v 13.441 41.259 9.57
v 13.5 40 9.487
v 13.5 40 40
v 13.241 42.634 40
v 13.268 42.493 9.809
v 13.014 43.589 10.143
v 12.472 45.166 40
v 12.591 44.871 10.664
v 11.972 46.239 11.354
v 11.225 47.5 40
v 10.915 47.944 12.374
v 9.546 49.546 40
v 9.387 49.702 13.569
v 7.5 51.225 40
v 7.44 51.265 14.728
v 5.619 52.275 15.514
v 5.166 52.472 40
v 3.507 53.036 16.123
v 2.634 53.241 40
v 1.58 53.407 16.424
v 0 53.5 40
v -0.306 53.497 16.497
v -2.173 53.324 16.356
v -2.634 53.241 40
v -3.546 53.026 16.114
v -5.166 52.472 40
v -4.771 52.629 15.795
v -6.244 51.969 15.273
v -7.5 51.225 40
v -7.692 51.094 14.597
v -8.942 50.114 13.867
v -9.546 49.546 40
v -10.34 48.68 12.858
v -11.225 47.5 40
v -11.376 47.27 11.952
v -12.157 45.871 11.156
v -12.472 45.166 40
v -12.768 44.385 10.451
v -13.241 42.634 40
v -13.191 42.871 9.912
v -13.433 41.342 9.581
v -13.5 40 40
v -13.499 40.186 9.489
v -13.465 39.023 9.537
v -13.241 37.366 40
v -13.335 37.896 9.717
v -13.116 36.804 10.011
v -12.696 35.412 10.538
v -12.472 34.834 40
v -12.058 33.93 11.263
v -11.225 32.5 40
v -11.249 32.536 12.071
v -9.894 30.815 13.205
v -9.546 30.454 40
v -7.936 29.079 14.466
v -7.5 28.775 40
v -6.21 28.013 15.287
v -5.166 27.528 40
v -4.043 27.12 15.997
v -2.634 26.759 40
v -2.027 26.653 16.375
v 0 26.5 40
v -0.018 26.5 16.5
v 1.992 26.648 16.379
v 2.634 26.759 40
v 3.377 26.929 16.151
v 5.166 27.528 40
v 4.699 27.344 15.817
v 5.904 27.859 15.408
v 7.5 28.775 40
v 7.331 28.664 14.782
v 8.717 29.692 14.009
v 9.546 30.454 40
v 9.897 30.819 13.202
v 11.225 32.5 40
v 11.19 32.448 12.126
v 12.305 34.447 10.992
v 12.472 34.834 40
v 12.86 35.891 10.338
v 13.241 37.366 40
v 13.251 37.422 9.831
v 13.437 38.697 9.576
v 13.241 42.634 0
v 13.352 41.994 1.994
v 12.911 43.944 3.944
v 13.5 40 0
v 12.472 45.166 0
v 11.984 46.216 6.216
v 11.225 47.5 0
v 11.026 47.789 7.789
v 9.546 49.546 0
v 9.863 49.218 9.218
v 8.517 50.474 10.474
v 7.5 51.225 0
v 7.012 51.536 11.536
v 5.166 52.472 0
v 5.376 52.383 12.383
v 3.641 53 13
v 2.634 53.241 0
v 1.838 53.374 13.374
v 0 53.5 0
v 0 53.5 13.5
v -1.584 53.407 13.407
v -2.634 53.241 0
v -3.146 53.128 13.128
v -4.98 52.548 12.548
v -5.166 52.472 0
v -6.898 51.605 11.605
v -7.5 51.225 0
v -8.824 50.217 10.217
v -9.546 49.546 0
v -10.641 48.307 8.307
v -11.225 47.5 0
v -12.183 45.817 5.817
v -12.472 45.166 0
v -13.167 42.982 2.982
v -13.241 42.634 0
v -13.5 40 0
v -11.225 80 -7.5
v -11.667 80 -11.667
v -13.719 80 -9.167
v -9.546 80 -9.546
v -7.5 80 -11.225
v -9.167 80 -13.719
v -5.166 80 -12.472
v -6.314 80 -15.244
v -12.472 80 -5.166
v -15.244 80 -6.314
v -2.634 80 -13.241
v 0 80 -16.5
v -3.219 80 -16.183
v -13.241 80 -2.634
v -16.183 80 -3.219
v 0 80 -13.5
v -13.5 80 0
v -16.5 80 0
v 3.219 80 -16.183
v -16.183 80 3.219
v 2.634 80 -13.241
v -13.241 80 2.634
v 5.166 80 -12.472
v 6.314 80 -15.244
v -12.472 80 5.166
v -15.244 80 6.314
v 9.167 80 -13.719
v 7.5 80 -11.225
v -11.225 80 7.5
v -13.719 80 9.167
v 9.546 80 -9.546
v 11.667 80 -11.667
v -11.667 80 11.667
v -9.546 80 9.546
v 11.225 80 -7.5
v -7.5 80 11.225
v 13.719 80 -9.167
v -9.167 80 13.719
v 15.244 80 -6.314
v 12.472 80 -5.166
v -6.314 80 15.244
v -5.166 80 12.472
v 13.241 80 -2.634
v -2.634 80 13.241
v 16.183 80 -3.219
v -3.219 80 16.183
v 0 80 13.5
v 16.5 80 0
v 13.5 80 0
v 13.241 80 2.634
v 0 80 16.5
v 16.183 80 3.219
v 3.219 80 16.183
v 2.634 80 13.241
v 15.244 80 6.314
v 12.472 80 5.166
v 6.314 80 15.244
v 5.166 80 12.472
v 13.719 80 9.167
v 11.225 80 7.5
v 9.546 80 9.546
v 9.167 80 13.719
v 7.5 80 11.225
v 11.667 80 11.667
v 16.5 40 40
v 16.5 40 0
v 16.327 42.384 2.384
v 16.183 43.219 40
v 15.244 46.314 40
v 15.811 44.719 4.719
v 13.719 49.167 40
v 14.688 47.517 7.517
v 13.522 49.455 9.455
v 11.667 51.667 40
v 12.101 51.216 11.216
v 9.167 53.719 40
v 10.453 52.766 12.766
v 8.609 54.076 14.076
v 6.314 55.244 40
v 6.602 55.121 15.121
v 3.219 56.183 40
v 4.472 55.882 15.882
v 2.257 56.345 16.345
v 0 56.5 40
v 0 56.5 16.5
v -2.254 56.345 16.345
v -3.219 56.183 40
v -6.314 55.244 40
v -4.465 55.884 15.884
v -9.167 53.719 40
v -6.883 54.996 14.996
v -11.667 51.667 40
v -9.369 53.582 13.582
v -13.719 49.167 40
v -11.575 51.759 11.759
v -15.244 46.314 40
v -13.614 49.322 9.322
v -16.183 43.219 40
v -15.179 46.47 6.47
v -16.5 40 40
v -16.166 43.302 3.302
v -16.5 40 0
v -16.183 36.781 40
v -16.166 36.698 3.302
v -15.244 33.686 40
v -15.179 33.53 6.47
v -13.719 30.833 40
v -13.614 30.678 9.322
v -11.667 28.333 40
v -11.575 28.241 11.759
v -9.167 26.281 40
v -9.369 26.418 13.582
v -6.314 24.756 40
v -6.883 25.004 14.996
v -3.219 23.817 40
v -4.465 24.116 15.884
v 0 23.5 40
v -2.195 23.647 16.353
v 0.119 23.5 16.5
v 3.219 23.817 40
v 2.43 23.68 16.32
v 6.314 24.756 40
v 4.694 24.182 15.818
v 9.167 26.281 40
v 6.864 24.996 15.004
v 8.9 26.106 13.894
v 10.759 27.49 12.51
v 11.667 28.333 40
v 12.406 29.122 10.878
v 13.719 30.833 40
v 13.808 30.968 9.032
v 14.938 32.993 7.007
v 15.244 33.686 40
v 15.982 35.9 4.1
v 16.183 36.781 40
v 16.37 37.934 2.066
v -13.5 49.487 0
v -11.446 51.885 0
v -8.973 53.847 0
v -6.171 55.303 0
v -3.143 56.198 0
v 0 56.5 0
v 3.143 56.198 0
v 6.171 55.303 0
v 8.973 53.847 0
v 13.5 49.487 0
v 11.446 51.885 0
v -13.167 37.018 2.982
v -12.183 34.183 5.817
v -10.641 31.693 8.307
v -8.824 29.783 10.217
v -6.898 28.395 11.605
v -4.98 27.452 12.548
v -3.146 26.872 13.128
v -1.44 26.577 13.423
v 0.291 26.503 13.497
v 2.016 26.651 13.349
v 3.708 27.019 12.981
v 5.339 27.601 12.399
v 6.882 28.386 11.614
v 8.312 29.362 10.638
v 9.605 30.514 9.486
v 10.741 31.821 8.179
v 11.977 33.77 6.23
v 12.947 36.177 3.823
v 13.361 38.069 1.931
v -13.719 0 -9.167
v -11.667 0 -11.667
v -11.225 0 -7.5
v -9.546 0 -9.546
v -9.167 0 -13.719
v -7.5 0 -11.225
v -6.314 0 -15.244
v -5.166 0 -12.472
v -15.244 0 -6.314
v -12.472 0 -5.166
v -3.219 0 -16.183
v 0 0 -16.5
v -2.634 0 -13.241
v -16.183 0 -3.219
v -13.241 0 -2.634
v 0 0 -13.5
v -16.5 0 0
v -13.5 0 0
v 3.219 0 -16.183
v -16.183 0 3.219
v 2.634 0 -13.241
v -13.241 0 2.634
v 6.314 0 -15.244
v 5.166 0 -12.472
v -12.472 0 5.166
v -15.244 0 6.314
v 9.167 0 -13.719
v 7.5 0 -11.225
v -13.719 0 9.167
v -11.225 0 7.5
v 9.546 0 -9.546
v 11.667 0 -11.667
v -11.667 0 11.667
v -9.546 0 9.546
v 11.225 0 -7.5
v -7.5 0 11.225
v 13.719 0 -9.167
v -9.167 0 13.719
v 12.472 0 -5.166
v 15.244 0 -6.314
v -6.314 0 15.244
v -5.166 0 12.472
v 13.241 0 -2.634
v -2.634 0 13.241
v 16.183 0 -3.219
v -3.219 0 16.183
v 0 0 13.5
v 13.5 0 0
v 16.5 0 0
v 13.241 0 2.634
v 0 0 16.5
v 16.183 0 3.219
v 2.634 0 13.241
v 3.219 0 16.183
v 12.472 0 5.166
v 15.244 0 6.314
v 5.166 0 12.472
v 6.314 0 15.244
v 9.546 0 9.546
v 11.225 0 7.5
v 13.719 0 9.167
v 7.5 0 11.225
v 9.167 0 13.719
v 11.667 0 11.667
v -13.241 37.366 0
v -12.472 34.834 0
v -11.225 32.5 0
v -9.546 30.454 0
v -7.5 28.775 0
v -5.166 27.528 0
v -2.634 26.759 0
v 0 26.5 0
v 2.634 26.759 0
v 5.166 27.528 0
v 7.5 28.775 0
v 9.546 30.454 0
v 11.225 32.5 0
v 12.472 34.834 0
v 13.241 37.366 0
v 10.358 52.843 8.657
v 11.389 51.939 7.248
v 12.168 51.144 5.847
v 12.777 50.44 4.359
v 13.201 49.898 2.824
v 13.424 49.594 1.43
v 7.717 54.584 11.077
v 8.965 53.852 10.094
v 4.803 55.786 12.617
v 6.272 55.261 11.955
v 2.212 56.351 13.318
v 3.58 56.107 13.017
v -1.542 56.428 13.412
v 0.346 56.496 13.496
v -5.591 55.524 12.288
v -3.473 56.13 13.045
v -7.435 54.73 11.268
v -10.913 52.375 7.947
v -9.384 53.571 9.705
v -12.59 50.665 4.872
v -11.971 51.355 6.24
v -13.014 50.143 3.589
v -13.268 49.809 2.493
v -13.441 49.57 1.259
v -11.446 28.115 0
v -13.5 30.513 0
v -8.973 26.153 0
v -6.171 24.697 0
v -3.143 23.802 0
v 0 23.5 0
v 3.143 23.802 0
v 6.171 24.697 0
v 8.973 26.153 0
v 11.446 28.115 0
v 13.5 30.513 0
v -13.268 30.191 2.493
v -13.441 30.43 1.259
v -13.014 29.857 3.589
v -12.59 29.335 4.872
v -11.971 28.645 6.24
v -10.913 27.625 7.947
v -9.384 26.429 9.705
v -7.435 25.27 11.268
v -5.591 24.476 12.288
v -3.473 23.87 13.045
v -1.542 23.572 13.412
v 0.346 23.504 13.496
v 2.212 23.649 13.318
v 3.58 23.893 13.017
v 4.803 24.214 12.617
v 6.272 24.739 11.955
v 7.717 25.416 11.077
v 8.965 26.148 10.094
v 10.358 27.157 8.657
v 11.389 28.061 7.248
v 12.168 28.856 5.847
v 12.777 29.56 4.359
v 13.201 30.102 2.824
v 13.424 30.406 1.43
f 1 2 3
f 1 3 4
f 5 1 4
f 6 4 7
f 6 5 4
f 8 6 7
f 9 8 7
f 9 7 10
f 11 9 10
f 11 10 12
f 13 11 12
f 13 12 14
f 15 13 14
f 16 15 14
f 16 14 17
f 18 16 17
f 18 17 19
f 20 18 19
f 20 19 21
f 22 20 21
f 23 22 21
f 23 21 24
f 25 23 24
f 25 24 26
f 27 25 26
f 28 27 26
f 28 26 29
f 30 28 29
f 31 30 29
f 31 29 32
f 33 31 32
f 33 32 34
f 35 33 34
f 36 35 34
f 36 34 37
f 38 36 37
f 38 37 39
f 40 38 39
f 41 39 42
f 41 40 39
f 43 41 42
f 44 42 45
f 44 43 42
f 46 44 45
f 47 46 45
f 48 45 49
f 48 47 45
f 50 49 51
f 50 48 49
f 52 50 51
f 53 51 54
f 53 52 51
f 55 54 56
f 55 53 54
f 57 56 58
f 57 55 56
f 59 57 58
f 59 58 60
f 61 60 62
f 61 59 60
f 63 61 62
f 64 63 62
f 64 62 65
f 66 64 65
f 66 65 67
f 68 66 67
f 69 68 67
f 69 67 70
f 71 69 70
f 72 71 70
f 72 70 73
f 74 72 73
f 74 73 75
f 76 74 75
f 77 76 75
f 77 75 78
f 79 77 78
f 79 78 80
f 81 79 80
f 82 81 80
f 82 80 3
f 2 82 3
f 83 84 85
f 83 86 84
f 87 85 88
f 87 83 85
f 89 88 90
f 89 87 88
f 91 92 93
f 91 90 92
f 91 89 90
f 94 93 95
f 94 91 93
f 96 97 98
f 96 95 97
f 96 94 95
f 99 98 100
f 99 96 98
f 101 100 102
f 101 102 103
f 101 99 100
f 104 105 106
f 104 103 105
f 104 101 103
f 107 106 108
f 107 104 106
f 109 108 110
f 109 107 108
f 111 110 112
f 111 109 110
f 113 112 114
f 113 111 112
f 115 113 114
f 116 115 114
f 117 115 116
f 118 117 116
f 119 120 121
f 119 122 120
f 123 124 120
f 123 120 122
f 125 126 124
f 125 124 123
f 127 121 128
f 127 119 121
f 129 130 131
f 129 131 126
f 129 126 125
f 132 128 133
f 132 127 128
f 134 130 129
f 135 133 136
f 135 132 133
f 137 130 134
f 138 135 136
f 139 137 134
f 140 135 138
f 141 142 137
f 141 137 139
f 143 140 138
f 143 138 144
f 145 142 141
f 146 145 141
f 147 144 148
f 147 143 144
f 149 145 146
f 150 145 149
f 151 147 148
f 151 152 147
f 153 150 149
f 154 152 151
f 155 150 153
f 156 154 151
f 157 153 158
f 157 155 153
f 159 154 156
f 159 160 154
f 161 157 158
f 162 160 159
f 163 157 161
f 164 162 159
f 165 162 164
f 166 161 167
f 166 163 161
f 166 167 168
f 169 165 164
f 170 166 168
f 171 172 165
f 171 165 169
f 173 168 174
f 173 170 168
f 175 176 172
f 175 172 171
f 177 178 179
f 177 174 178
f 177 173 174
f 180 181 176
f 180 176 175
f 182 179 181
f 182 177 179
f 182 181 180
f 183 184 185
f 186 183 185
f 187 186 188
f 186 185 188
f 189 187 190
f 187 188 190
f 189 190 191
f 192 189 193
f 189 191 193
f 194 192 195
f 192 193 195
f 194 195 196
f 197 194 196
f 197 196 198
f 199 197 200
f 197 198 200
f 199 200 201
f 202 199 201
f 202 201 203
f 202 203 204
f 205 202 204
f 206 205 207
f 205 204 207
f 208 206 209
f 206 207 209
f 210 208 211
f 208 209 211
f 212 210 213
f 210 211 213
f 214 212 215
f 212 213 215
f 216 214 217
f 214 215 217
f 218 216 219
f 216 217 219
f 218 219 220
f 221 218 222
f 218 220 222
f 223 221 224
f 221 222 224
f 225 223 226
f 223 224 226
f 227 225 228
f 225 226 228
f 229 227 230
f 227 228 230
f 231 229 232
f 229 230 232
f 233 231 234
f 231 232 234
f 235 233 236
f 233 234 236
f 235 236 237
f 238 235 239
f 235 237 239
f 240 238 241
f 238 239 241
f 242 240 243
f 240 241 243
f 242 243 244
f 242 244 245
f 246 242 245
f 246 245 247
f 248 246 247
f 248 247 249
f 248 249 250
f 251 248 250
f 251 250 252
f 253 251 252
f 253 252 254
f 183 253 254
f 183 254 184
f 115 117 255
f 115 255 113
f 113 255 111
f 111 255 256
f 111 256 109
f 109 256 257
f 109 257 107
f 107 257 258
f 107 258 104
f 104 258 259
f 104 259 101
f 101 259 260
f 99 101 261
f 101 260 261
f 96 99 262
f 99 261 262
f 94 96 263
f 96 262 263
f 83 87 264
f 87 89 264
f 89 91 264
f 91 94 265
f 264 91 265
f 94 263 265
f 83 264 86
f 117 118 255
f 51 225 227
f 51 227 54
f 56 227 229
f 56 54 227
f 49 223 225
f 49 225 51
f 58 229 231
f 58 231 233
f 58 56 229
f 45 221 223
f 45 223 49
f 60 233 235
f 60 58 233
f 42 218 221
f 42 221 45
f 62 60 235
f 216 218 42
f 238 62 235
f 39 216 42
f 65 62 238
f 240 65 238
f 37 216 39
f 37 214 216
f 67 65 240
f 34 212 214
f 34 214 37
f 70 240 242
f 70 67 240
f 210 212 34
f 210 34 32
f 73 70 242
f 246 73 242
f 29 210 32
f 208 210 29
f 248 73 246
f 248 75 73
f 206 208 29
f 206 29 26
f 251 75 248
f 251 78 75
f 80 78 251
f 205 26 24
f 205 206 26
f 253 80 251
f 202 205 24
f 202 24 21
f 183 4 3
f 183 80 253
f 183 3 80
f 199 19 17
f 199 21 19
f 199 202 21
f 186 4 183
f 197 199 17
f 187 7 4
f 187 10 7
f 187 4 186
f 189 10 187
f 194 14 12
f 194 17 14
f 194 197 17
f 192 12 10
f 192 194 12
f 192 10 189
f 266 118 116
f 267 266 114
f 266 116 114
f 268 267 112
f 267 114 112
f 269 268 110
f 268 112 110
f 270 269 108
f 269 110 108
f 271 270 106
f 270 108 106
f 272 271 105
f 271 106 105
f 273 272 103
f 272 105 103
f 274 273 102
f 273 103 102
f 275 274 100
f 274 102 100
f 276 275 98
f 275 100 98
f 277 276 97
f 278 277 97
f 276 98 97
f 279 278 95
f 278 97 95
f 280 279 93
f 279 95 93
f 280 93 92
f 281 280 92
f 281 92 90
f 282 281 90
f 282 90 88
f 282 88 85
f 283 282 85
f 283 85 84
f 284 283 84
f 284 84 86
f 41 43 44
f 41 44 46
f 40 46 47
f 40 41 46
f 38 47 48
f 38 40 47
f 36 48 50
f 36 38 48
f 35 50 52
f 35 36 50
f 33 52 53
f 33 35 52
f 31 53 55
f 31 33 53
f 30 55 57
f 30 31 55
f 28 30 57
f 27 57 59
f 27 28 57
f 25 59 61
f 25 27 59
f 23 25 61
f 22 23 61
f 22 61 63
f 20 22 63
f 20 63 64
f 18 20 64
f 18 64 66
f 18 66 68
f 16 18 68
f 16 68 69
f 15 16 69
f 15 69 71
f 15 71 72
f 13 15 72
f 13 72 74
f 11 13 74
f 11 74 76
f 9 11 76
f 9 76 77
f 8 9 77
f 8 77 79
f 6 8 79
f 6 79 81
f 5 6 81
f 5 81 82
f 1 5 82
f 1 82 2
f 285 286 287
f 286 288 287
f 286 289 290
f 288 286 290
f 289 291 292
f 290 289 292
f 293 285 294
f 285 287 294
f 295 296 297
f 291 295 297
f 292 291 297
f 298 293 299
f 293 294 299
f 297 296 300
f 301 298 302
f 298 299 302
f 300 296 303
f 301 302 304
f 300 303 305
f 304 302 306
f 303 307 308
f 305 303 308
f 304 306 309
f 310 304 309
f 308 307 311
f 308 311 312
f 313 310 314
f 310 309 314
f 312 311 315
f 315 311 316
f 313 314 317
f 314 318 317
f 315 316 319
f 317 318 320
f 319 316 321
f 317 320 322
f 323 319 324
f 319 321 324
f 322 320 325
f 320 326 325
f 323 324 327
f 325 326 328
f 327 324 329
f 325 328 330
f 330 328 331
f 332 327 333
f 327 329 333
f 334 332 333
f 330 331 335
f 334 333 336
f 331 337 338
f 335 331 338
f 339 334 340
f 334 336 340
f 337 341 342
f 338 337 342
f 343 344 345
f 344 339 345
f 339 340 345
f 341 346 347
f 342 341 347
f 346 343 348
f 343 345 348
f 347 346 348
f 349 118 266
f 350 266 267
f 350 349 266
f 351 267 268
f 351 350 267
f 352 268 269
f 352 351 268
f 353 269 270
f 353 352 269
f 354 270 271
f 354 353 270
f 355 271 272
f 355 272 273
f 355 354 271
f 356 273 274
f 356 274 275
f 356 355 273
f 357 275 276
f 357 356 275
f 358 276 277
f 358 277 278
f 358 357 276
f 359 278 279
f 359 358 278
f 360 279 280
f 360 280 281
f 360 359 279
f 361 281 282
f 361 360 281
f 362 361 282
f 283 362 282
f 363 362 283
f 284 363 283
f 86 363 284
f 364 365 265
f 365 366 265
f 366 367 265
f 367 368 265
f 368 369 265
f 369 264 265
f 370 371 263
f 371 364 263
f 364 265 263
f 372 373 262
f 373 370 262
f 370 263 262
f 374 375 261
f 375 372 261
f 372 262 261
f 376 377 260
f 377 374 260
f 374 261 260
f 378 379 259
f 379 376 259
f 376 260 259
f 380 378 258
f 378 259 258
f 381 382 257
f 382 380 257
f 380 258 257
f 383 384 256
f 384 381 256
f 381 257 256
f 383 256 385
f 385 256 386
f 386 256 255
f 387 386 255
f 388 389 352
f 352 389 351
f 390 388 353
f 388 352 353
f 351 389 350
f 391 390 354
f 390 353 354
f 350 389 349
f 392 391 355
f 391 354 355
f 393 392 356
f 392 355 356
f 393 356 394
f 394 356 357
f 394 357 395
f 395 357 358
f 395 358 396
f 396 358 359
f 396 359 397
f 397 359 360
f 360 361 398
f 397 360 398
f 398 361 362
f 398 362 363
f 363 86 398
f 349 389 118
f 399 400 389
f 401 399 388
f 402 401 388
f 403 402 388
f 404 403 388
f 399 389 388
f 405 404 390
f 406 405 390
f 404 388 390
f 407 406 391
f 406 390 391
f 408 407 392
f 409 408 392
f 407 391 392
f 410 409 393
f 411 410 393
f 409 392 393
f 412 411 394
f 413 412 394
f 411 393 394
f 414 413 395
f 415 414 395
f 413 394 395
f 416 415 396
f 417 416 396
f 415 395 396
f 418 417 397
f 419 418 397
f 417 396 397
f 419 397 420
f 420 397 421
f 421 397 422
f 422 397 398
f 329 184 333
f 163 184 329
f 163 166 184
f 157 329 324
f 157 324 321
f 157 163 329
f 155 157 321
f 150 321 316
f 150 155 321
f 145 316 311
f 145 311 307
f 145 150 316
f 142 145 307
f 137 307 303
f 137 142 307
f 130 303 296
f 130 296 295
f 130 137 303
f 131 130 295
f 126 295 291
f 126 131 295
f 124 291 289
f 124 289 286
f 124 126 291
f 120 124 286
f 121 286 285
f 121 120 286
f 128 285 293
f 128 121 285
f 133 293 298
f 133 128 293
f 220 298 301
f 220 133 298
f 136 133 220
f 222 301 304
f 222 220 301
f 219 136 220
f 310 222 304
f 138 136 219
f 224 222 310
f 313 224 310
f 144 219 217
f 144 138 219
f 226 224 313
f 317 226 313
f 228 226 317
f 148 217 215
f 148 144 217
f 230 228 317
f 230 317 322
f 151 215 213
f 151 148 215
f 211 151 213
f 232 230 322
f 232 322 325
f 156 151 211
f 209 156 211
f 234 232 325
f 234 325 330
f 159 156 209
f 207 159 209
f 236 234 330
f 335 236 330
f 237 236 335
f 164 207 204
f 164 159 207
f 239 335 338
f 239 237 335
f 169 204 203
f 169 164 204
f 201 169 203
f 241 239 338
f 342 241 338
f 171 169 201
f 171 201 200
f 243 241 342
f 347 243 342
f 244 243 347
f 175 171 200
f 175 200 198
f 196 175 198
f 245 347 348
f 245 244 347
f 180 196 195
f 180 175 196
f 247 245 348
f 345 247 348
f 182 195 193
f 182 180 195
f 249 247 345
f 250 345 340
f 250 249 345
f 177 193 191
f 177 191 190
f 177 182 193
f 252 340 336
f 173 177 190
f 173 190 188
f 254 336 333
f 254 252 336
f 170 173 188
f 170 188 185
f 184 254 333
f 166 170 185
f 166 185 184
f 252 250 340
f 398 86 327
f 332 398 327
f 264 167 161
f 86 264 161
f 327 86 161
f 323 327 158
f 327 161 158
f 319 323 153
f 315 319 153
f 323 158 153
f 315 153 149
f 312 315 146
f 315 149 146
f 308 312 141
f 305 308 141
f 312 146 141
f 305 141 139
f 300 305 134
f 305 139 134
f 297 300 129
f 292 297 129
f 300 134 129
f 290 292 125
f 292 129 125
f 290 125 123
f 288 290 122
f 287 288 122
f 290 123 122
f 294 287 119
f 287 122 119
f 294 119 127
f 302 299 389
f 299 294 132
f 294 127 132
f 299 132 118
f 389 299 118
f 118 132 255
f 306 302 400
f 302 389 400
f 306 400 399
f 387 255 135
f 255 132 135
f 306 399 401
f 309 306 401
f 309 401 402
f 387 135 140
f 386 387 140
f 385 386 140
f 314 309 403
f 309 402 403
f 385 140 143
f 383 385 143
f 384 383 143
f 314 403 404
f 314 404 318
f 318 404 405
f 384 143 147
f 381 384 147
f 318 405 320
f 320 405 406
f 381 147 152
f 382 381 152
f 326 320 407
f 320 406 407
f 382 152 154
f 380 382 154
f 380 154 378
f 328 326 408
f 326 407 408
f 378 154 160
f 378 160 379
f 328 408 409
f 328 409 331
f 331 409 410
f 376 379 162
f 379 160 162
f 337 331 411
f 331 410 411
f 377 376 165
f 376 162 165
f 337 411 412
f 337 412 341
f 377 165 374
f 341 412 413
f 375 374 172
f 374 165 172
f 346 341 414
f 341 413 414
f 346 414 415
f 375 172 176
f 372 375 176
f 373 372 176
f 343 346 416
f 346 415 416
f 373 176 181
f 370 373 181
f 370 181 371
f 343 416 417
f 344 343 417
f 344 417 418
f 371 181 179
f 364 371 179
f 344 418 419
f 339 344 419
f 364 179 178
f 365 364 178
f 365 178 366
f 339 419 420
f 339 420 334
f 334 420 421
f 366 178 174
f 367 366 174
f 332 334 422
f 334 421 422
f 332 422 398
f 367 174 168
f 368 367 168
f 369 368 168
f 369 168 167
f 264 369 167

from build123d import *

# Parameters (mm, degrees)
SKETCH1_R           = 16.5
SKETCH1_R_2         = 13.5
SKETCH4_R           = 16.5
SKETCH4_R_2         = 13.5
BOSS_EXTRUDE2_DEPTH = 40


with BuildPart() as part:
    # Sweep2: sweep along a path in Sketch3
    with BuildLine(Plane.XY) as sweep2_path:
        Line((0, 0), (0, 80))
    # Sketch1 → Sweep2 (sweep)
    with BuildSketch(Plane(origin=(0, 0, 0), x_dir=(1, 0, 0), z_dir=(0, 1, 0))):
        Circle(SKETCH1_R)
        Circle(SKETCH1_R_2, mode=Mode.SUBTRACT)
    sweep(path=sweep2_path.line)

    # Sketch4 → Boss-Extrude2 (add)
    with BuildSketch(Plane.XY):
        with Locations((0, 40)):
            Circle(SKETCH4_R)
        with Locations((0, 40)):
            Circle(SKETCH4_R_2, mode=Mode.SUBTRACT)
    extrude(amount=BOSS_EXTRUDE2_DEPTH)


solid = part.part
